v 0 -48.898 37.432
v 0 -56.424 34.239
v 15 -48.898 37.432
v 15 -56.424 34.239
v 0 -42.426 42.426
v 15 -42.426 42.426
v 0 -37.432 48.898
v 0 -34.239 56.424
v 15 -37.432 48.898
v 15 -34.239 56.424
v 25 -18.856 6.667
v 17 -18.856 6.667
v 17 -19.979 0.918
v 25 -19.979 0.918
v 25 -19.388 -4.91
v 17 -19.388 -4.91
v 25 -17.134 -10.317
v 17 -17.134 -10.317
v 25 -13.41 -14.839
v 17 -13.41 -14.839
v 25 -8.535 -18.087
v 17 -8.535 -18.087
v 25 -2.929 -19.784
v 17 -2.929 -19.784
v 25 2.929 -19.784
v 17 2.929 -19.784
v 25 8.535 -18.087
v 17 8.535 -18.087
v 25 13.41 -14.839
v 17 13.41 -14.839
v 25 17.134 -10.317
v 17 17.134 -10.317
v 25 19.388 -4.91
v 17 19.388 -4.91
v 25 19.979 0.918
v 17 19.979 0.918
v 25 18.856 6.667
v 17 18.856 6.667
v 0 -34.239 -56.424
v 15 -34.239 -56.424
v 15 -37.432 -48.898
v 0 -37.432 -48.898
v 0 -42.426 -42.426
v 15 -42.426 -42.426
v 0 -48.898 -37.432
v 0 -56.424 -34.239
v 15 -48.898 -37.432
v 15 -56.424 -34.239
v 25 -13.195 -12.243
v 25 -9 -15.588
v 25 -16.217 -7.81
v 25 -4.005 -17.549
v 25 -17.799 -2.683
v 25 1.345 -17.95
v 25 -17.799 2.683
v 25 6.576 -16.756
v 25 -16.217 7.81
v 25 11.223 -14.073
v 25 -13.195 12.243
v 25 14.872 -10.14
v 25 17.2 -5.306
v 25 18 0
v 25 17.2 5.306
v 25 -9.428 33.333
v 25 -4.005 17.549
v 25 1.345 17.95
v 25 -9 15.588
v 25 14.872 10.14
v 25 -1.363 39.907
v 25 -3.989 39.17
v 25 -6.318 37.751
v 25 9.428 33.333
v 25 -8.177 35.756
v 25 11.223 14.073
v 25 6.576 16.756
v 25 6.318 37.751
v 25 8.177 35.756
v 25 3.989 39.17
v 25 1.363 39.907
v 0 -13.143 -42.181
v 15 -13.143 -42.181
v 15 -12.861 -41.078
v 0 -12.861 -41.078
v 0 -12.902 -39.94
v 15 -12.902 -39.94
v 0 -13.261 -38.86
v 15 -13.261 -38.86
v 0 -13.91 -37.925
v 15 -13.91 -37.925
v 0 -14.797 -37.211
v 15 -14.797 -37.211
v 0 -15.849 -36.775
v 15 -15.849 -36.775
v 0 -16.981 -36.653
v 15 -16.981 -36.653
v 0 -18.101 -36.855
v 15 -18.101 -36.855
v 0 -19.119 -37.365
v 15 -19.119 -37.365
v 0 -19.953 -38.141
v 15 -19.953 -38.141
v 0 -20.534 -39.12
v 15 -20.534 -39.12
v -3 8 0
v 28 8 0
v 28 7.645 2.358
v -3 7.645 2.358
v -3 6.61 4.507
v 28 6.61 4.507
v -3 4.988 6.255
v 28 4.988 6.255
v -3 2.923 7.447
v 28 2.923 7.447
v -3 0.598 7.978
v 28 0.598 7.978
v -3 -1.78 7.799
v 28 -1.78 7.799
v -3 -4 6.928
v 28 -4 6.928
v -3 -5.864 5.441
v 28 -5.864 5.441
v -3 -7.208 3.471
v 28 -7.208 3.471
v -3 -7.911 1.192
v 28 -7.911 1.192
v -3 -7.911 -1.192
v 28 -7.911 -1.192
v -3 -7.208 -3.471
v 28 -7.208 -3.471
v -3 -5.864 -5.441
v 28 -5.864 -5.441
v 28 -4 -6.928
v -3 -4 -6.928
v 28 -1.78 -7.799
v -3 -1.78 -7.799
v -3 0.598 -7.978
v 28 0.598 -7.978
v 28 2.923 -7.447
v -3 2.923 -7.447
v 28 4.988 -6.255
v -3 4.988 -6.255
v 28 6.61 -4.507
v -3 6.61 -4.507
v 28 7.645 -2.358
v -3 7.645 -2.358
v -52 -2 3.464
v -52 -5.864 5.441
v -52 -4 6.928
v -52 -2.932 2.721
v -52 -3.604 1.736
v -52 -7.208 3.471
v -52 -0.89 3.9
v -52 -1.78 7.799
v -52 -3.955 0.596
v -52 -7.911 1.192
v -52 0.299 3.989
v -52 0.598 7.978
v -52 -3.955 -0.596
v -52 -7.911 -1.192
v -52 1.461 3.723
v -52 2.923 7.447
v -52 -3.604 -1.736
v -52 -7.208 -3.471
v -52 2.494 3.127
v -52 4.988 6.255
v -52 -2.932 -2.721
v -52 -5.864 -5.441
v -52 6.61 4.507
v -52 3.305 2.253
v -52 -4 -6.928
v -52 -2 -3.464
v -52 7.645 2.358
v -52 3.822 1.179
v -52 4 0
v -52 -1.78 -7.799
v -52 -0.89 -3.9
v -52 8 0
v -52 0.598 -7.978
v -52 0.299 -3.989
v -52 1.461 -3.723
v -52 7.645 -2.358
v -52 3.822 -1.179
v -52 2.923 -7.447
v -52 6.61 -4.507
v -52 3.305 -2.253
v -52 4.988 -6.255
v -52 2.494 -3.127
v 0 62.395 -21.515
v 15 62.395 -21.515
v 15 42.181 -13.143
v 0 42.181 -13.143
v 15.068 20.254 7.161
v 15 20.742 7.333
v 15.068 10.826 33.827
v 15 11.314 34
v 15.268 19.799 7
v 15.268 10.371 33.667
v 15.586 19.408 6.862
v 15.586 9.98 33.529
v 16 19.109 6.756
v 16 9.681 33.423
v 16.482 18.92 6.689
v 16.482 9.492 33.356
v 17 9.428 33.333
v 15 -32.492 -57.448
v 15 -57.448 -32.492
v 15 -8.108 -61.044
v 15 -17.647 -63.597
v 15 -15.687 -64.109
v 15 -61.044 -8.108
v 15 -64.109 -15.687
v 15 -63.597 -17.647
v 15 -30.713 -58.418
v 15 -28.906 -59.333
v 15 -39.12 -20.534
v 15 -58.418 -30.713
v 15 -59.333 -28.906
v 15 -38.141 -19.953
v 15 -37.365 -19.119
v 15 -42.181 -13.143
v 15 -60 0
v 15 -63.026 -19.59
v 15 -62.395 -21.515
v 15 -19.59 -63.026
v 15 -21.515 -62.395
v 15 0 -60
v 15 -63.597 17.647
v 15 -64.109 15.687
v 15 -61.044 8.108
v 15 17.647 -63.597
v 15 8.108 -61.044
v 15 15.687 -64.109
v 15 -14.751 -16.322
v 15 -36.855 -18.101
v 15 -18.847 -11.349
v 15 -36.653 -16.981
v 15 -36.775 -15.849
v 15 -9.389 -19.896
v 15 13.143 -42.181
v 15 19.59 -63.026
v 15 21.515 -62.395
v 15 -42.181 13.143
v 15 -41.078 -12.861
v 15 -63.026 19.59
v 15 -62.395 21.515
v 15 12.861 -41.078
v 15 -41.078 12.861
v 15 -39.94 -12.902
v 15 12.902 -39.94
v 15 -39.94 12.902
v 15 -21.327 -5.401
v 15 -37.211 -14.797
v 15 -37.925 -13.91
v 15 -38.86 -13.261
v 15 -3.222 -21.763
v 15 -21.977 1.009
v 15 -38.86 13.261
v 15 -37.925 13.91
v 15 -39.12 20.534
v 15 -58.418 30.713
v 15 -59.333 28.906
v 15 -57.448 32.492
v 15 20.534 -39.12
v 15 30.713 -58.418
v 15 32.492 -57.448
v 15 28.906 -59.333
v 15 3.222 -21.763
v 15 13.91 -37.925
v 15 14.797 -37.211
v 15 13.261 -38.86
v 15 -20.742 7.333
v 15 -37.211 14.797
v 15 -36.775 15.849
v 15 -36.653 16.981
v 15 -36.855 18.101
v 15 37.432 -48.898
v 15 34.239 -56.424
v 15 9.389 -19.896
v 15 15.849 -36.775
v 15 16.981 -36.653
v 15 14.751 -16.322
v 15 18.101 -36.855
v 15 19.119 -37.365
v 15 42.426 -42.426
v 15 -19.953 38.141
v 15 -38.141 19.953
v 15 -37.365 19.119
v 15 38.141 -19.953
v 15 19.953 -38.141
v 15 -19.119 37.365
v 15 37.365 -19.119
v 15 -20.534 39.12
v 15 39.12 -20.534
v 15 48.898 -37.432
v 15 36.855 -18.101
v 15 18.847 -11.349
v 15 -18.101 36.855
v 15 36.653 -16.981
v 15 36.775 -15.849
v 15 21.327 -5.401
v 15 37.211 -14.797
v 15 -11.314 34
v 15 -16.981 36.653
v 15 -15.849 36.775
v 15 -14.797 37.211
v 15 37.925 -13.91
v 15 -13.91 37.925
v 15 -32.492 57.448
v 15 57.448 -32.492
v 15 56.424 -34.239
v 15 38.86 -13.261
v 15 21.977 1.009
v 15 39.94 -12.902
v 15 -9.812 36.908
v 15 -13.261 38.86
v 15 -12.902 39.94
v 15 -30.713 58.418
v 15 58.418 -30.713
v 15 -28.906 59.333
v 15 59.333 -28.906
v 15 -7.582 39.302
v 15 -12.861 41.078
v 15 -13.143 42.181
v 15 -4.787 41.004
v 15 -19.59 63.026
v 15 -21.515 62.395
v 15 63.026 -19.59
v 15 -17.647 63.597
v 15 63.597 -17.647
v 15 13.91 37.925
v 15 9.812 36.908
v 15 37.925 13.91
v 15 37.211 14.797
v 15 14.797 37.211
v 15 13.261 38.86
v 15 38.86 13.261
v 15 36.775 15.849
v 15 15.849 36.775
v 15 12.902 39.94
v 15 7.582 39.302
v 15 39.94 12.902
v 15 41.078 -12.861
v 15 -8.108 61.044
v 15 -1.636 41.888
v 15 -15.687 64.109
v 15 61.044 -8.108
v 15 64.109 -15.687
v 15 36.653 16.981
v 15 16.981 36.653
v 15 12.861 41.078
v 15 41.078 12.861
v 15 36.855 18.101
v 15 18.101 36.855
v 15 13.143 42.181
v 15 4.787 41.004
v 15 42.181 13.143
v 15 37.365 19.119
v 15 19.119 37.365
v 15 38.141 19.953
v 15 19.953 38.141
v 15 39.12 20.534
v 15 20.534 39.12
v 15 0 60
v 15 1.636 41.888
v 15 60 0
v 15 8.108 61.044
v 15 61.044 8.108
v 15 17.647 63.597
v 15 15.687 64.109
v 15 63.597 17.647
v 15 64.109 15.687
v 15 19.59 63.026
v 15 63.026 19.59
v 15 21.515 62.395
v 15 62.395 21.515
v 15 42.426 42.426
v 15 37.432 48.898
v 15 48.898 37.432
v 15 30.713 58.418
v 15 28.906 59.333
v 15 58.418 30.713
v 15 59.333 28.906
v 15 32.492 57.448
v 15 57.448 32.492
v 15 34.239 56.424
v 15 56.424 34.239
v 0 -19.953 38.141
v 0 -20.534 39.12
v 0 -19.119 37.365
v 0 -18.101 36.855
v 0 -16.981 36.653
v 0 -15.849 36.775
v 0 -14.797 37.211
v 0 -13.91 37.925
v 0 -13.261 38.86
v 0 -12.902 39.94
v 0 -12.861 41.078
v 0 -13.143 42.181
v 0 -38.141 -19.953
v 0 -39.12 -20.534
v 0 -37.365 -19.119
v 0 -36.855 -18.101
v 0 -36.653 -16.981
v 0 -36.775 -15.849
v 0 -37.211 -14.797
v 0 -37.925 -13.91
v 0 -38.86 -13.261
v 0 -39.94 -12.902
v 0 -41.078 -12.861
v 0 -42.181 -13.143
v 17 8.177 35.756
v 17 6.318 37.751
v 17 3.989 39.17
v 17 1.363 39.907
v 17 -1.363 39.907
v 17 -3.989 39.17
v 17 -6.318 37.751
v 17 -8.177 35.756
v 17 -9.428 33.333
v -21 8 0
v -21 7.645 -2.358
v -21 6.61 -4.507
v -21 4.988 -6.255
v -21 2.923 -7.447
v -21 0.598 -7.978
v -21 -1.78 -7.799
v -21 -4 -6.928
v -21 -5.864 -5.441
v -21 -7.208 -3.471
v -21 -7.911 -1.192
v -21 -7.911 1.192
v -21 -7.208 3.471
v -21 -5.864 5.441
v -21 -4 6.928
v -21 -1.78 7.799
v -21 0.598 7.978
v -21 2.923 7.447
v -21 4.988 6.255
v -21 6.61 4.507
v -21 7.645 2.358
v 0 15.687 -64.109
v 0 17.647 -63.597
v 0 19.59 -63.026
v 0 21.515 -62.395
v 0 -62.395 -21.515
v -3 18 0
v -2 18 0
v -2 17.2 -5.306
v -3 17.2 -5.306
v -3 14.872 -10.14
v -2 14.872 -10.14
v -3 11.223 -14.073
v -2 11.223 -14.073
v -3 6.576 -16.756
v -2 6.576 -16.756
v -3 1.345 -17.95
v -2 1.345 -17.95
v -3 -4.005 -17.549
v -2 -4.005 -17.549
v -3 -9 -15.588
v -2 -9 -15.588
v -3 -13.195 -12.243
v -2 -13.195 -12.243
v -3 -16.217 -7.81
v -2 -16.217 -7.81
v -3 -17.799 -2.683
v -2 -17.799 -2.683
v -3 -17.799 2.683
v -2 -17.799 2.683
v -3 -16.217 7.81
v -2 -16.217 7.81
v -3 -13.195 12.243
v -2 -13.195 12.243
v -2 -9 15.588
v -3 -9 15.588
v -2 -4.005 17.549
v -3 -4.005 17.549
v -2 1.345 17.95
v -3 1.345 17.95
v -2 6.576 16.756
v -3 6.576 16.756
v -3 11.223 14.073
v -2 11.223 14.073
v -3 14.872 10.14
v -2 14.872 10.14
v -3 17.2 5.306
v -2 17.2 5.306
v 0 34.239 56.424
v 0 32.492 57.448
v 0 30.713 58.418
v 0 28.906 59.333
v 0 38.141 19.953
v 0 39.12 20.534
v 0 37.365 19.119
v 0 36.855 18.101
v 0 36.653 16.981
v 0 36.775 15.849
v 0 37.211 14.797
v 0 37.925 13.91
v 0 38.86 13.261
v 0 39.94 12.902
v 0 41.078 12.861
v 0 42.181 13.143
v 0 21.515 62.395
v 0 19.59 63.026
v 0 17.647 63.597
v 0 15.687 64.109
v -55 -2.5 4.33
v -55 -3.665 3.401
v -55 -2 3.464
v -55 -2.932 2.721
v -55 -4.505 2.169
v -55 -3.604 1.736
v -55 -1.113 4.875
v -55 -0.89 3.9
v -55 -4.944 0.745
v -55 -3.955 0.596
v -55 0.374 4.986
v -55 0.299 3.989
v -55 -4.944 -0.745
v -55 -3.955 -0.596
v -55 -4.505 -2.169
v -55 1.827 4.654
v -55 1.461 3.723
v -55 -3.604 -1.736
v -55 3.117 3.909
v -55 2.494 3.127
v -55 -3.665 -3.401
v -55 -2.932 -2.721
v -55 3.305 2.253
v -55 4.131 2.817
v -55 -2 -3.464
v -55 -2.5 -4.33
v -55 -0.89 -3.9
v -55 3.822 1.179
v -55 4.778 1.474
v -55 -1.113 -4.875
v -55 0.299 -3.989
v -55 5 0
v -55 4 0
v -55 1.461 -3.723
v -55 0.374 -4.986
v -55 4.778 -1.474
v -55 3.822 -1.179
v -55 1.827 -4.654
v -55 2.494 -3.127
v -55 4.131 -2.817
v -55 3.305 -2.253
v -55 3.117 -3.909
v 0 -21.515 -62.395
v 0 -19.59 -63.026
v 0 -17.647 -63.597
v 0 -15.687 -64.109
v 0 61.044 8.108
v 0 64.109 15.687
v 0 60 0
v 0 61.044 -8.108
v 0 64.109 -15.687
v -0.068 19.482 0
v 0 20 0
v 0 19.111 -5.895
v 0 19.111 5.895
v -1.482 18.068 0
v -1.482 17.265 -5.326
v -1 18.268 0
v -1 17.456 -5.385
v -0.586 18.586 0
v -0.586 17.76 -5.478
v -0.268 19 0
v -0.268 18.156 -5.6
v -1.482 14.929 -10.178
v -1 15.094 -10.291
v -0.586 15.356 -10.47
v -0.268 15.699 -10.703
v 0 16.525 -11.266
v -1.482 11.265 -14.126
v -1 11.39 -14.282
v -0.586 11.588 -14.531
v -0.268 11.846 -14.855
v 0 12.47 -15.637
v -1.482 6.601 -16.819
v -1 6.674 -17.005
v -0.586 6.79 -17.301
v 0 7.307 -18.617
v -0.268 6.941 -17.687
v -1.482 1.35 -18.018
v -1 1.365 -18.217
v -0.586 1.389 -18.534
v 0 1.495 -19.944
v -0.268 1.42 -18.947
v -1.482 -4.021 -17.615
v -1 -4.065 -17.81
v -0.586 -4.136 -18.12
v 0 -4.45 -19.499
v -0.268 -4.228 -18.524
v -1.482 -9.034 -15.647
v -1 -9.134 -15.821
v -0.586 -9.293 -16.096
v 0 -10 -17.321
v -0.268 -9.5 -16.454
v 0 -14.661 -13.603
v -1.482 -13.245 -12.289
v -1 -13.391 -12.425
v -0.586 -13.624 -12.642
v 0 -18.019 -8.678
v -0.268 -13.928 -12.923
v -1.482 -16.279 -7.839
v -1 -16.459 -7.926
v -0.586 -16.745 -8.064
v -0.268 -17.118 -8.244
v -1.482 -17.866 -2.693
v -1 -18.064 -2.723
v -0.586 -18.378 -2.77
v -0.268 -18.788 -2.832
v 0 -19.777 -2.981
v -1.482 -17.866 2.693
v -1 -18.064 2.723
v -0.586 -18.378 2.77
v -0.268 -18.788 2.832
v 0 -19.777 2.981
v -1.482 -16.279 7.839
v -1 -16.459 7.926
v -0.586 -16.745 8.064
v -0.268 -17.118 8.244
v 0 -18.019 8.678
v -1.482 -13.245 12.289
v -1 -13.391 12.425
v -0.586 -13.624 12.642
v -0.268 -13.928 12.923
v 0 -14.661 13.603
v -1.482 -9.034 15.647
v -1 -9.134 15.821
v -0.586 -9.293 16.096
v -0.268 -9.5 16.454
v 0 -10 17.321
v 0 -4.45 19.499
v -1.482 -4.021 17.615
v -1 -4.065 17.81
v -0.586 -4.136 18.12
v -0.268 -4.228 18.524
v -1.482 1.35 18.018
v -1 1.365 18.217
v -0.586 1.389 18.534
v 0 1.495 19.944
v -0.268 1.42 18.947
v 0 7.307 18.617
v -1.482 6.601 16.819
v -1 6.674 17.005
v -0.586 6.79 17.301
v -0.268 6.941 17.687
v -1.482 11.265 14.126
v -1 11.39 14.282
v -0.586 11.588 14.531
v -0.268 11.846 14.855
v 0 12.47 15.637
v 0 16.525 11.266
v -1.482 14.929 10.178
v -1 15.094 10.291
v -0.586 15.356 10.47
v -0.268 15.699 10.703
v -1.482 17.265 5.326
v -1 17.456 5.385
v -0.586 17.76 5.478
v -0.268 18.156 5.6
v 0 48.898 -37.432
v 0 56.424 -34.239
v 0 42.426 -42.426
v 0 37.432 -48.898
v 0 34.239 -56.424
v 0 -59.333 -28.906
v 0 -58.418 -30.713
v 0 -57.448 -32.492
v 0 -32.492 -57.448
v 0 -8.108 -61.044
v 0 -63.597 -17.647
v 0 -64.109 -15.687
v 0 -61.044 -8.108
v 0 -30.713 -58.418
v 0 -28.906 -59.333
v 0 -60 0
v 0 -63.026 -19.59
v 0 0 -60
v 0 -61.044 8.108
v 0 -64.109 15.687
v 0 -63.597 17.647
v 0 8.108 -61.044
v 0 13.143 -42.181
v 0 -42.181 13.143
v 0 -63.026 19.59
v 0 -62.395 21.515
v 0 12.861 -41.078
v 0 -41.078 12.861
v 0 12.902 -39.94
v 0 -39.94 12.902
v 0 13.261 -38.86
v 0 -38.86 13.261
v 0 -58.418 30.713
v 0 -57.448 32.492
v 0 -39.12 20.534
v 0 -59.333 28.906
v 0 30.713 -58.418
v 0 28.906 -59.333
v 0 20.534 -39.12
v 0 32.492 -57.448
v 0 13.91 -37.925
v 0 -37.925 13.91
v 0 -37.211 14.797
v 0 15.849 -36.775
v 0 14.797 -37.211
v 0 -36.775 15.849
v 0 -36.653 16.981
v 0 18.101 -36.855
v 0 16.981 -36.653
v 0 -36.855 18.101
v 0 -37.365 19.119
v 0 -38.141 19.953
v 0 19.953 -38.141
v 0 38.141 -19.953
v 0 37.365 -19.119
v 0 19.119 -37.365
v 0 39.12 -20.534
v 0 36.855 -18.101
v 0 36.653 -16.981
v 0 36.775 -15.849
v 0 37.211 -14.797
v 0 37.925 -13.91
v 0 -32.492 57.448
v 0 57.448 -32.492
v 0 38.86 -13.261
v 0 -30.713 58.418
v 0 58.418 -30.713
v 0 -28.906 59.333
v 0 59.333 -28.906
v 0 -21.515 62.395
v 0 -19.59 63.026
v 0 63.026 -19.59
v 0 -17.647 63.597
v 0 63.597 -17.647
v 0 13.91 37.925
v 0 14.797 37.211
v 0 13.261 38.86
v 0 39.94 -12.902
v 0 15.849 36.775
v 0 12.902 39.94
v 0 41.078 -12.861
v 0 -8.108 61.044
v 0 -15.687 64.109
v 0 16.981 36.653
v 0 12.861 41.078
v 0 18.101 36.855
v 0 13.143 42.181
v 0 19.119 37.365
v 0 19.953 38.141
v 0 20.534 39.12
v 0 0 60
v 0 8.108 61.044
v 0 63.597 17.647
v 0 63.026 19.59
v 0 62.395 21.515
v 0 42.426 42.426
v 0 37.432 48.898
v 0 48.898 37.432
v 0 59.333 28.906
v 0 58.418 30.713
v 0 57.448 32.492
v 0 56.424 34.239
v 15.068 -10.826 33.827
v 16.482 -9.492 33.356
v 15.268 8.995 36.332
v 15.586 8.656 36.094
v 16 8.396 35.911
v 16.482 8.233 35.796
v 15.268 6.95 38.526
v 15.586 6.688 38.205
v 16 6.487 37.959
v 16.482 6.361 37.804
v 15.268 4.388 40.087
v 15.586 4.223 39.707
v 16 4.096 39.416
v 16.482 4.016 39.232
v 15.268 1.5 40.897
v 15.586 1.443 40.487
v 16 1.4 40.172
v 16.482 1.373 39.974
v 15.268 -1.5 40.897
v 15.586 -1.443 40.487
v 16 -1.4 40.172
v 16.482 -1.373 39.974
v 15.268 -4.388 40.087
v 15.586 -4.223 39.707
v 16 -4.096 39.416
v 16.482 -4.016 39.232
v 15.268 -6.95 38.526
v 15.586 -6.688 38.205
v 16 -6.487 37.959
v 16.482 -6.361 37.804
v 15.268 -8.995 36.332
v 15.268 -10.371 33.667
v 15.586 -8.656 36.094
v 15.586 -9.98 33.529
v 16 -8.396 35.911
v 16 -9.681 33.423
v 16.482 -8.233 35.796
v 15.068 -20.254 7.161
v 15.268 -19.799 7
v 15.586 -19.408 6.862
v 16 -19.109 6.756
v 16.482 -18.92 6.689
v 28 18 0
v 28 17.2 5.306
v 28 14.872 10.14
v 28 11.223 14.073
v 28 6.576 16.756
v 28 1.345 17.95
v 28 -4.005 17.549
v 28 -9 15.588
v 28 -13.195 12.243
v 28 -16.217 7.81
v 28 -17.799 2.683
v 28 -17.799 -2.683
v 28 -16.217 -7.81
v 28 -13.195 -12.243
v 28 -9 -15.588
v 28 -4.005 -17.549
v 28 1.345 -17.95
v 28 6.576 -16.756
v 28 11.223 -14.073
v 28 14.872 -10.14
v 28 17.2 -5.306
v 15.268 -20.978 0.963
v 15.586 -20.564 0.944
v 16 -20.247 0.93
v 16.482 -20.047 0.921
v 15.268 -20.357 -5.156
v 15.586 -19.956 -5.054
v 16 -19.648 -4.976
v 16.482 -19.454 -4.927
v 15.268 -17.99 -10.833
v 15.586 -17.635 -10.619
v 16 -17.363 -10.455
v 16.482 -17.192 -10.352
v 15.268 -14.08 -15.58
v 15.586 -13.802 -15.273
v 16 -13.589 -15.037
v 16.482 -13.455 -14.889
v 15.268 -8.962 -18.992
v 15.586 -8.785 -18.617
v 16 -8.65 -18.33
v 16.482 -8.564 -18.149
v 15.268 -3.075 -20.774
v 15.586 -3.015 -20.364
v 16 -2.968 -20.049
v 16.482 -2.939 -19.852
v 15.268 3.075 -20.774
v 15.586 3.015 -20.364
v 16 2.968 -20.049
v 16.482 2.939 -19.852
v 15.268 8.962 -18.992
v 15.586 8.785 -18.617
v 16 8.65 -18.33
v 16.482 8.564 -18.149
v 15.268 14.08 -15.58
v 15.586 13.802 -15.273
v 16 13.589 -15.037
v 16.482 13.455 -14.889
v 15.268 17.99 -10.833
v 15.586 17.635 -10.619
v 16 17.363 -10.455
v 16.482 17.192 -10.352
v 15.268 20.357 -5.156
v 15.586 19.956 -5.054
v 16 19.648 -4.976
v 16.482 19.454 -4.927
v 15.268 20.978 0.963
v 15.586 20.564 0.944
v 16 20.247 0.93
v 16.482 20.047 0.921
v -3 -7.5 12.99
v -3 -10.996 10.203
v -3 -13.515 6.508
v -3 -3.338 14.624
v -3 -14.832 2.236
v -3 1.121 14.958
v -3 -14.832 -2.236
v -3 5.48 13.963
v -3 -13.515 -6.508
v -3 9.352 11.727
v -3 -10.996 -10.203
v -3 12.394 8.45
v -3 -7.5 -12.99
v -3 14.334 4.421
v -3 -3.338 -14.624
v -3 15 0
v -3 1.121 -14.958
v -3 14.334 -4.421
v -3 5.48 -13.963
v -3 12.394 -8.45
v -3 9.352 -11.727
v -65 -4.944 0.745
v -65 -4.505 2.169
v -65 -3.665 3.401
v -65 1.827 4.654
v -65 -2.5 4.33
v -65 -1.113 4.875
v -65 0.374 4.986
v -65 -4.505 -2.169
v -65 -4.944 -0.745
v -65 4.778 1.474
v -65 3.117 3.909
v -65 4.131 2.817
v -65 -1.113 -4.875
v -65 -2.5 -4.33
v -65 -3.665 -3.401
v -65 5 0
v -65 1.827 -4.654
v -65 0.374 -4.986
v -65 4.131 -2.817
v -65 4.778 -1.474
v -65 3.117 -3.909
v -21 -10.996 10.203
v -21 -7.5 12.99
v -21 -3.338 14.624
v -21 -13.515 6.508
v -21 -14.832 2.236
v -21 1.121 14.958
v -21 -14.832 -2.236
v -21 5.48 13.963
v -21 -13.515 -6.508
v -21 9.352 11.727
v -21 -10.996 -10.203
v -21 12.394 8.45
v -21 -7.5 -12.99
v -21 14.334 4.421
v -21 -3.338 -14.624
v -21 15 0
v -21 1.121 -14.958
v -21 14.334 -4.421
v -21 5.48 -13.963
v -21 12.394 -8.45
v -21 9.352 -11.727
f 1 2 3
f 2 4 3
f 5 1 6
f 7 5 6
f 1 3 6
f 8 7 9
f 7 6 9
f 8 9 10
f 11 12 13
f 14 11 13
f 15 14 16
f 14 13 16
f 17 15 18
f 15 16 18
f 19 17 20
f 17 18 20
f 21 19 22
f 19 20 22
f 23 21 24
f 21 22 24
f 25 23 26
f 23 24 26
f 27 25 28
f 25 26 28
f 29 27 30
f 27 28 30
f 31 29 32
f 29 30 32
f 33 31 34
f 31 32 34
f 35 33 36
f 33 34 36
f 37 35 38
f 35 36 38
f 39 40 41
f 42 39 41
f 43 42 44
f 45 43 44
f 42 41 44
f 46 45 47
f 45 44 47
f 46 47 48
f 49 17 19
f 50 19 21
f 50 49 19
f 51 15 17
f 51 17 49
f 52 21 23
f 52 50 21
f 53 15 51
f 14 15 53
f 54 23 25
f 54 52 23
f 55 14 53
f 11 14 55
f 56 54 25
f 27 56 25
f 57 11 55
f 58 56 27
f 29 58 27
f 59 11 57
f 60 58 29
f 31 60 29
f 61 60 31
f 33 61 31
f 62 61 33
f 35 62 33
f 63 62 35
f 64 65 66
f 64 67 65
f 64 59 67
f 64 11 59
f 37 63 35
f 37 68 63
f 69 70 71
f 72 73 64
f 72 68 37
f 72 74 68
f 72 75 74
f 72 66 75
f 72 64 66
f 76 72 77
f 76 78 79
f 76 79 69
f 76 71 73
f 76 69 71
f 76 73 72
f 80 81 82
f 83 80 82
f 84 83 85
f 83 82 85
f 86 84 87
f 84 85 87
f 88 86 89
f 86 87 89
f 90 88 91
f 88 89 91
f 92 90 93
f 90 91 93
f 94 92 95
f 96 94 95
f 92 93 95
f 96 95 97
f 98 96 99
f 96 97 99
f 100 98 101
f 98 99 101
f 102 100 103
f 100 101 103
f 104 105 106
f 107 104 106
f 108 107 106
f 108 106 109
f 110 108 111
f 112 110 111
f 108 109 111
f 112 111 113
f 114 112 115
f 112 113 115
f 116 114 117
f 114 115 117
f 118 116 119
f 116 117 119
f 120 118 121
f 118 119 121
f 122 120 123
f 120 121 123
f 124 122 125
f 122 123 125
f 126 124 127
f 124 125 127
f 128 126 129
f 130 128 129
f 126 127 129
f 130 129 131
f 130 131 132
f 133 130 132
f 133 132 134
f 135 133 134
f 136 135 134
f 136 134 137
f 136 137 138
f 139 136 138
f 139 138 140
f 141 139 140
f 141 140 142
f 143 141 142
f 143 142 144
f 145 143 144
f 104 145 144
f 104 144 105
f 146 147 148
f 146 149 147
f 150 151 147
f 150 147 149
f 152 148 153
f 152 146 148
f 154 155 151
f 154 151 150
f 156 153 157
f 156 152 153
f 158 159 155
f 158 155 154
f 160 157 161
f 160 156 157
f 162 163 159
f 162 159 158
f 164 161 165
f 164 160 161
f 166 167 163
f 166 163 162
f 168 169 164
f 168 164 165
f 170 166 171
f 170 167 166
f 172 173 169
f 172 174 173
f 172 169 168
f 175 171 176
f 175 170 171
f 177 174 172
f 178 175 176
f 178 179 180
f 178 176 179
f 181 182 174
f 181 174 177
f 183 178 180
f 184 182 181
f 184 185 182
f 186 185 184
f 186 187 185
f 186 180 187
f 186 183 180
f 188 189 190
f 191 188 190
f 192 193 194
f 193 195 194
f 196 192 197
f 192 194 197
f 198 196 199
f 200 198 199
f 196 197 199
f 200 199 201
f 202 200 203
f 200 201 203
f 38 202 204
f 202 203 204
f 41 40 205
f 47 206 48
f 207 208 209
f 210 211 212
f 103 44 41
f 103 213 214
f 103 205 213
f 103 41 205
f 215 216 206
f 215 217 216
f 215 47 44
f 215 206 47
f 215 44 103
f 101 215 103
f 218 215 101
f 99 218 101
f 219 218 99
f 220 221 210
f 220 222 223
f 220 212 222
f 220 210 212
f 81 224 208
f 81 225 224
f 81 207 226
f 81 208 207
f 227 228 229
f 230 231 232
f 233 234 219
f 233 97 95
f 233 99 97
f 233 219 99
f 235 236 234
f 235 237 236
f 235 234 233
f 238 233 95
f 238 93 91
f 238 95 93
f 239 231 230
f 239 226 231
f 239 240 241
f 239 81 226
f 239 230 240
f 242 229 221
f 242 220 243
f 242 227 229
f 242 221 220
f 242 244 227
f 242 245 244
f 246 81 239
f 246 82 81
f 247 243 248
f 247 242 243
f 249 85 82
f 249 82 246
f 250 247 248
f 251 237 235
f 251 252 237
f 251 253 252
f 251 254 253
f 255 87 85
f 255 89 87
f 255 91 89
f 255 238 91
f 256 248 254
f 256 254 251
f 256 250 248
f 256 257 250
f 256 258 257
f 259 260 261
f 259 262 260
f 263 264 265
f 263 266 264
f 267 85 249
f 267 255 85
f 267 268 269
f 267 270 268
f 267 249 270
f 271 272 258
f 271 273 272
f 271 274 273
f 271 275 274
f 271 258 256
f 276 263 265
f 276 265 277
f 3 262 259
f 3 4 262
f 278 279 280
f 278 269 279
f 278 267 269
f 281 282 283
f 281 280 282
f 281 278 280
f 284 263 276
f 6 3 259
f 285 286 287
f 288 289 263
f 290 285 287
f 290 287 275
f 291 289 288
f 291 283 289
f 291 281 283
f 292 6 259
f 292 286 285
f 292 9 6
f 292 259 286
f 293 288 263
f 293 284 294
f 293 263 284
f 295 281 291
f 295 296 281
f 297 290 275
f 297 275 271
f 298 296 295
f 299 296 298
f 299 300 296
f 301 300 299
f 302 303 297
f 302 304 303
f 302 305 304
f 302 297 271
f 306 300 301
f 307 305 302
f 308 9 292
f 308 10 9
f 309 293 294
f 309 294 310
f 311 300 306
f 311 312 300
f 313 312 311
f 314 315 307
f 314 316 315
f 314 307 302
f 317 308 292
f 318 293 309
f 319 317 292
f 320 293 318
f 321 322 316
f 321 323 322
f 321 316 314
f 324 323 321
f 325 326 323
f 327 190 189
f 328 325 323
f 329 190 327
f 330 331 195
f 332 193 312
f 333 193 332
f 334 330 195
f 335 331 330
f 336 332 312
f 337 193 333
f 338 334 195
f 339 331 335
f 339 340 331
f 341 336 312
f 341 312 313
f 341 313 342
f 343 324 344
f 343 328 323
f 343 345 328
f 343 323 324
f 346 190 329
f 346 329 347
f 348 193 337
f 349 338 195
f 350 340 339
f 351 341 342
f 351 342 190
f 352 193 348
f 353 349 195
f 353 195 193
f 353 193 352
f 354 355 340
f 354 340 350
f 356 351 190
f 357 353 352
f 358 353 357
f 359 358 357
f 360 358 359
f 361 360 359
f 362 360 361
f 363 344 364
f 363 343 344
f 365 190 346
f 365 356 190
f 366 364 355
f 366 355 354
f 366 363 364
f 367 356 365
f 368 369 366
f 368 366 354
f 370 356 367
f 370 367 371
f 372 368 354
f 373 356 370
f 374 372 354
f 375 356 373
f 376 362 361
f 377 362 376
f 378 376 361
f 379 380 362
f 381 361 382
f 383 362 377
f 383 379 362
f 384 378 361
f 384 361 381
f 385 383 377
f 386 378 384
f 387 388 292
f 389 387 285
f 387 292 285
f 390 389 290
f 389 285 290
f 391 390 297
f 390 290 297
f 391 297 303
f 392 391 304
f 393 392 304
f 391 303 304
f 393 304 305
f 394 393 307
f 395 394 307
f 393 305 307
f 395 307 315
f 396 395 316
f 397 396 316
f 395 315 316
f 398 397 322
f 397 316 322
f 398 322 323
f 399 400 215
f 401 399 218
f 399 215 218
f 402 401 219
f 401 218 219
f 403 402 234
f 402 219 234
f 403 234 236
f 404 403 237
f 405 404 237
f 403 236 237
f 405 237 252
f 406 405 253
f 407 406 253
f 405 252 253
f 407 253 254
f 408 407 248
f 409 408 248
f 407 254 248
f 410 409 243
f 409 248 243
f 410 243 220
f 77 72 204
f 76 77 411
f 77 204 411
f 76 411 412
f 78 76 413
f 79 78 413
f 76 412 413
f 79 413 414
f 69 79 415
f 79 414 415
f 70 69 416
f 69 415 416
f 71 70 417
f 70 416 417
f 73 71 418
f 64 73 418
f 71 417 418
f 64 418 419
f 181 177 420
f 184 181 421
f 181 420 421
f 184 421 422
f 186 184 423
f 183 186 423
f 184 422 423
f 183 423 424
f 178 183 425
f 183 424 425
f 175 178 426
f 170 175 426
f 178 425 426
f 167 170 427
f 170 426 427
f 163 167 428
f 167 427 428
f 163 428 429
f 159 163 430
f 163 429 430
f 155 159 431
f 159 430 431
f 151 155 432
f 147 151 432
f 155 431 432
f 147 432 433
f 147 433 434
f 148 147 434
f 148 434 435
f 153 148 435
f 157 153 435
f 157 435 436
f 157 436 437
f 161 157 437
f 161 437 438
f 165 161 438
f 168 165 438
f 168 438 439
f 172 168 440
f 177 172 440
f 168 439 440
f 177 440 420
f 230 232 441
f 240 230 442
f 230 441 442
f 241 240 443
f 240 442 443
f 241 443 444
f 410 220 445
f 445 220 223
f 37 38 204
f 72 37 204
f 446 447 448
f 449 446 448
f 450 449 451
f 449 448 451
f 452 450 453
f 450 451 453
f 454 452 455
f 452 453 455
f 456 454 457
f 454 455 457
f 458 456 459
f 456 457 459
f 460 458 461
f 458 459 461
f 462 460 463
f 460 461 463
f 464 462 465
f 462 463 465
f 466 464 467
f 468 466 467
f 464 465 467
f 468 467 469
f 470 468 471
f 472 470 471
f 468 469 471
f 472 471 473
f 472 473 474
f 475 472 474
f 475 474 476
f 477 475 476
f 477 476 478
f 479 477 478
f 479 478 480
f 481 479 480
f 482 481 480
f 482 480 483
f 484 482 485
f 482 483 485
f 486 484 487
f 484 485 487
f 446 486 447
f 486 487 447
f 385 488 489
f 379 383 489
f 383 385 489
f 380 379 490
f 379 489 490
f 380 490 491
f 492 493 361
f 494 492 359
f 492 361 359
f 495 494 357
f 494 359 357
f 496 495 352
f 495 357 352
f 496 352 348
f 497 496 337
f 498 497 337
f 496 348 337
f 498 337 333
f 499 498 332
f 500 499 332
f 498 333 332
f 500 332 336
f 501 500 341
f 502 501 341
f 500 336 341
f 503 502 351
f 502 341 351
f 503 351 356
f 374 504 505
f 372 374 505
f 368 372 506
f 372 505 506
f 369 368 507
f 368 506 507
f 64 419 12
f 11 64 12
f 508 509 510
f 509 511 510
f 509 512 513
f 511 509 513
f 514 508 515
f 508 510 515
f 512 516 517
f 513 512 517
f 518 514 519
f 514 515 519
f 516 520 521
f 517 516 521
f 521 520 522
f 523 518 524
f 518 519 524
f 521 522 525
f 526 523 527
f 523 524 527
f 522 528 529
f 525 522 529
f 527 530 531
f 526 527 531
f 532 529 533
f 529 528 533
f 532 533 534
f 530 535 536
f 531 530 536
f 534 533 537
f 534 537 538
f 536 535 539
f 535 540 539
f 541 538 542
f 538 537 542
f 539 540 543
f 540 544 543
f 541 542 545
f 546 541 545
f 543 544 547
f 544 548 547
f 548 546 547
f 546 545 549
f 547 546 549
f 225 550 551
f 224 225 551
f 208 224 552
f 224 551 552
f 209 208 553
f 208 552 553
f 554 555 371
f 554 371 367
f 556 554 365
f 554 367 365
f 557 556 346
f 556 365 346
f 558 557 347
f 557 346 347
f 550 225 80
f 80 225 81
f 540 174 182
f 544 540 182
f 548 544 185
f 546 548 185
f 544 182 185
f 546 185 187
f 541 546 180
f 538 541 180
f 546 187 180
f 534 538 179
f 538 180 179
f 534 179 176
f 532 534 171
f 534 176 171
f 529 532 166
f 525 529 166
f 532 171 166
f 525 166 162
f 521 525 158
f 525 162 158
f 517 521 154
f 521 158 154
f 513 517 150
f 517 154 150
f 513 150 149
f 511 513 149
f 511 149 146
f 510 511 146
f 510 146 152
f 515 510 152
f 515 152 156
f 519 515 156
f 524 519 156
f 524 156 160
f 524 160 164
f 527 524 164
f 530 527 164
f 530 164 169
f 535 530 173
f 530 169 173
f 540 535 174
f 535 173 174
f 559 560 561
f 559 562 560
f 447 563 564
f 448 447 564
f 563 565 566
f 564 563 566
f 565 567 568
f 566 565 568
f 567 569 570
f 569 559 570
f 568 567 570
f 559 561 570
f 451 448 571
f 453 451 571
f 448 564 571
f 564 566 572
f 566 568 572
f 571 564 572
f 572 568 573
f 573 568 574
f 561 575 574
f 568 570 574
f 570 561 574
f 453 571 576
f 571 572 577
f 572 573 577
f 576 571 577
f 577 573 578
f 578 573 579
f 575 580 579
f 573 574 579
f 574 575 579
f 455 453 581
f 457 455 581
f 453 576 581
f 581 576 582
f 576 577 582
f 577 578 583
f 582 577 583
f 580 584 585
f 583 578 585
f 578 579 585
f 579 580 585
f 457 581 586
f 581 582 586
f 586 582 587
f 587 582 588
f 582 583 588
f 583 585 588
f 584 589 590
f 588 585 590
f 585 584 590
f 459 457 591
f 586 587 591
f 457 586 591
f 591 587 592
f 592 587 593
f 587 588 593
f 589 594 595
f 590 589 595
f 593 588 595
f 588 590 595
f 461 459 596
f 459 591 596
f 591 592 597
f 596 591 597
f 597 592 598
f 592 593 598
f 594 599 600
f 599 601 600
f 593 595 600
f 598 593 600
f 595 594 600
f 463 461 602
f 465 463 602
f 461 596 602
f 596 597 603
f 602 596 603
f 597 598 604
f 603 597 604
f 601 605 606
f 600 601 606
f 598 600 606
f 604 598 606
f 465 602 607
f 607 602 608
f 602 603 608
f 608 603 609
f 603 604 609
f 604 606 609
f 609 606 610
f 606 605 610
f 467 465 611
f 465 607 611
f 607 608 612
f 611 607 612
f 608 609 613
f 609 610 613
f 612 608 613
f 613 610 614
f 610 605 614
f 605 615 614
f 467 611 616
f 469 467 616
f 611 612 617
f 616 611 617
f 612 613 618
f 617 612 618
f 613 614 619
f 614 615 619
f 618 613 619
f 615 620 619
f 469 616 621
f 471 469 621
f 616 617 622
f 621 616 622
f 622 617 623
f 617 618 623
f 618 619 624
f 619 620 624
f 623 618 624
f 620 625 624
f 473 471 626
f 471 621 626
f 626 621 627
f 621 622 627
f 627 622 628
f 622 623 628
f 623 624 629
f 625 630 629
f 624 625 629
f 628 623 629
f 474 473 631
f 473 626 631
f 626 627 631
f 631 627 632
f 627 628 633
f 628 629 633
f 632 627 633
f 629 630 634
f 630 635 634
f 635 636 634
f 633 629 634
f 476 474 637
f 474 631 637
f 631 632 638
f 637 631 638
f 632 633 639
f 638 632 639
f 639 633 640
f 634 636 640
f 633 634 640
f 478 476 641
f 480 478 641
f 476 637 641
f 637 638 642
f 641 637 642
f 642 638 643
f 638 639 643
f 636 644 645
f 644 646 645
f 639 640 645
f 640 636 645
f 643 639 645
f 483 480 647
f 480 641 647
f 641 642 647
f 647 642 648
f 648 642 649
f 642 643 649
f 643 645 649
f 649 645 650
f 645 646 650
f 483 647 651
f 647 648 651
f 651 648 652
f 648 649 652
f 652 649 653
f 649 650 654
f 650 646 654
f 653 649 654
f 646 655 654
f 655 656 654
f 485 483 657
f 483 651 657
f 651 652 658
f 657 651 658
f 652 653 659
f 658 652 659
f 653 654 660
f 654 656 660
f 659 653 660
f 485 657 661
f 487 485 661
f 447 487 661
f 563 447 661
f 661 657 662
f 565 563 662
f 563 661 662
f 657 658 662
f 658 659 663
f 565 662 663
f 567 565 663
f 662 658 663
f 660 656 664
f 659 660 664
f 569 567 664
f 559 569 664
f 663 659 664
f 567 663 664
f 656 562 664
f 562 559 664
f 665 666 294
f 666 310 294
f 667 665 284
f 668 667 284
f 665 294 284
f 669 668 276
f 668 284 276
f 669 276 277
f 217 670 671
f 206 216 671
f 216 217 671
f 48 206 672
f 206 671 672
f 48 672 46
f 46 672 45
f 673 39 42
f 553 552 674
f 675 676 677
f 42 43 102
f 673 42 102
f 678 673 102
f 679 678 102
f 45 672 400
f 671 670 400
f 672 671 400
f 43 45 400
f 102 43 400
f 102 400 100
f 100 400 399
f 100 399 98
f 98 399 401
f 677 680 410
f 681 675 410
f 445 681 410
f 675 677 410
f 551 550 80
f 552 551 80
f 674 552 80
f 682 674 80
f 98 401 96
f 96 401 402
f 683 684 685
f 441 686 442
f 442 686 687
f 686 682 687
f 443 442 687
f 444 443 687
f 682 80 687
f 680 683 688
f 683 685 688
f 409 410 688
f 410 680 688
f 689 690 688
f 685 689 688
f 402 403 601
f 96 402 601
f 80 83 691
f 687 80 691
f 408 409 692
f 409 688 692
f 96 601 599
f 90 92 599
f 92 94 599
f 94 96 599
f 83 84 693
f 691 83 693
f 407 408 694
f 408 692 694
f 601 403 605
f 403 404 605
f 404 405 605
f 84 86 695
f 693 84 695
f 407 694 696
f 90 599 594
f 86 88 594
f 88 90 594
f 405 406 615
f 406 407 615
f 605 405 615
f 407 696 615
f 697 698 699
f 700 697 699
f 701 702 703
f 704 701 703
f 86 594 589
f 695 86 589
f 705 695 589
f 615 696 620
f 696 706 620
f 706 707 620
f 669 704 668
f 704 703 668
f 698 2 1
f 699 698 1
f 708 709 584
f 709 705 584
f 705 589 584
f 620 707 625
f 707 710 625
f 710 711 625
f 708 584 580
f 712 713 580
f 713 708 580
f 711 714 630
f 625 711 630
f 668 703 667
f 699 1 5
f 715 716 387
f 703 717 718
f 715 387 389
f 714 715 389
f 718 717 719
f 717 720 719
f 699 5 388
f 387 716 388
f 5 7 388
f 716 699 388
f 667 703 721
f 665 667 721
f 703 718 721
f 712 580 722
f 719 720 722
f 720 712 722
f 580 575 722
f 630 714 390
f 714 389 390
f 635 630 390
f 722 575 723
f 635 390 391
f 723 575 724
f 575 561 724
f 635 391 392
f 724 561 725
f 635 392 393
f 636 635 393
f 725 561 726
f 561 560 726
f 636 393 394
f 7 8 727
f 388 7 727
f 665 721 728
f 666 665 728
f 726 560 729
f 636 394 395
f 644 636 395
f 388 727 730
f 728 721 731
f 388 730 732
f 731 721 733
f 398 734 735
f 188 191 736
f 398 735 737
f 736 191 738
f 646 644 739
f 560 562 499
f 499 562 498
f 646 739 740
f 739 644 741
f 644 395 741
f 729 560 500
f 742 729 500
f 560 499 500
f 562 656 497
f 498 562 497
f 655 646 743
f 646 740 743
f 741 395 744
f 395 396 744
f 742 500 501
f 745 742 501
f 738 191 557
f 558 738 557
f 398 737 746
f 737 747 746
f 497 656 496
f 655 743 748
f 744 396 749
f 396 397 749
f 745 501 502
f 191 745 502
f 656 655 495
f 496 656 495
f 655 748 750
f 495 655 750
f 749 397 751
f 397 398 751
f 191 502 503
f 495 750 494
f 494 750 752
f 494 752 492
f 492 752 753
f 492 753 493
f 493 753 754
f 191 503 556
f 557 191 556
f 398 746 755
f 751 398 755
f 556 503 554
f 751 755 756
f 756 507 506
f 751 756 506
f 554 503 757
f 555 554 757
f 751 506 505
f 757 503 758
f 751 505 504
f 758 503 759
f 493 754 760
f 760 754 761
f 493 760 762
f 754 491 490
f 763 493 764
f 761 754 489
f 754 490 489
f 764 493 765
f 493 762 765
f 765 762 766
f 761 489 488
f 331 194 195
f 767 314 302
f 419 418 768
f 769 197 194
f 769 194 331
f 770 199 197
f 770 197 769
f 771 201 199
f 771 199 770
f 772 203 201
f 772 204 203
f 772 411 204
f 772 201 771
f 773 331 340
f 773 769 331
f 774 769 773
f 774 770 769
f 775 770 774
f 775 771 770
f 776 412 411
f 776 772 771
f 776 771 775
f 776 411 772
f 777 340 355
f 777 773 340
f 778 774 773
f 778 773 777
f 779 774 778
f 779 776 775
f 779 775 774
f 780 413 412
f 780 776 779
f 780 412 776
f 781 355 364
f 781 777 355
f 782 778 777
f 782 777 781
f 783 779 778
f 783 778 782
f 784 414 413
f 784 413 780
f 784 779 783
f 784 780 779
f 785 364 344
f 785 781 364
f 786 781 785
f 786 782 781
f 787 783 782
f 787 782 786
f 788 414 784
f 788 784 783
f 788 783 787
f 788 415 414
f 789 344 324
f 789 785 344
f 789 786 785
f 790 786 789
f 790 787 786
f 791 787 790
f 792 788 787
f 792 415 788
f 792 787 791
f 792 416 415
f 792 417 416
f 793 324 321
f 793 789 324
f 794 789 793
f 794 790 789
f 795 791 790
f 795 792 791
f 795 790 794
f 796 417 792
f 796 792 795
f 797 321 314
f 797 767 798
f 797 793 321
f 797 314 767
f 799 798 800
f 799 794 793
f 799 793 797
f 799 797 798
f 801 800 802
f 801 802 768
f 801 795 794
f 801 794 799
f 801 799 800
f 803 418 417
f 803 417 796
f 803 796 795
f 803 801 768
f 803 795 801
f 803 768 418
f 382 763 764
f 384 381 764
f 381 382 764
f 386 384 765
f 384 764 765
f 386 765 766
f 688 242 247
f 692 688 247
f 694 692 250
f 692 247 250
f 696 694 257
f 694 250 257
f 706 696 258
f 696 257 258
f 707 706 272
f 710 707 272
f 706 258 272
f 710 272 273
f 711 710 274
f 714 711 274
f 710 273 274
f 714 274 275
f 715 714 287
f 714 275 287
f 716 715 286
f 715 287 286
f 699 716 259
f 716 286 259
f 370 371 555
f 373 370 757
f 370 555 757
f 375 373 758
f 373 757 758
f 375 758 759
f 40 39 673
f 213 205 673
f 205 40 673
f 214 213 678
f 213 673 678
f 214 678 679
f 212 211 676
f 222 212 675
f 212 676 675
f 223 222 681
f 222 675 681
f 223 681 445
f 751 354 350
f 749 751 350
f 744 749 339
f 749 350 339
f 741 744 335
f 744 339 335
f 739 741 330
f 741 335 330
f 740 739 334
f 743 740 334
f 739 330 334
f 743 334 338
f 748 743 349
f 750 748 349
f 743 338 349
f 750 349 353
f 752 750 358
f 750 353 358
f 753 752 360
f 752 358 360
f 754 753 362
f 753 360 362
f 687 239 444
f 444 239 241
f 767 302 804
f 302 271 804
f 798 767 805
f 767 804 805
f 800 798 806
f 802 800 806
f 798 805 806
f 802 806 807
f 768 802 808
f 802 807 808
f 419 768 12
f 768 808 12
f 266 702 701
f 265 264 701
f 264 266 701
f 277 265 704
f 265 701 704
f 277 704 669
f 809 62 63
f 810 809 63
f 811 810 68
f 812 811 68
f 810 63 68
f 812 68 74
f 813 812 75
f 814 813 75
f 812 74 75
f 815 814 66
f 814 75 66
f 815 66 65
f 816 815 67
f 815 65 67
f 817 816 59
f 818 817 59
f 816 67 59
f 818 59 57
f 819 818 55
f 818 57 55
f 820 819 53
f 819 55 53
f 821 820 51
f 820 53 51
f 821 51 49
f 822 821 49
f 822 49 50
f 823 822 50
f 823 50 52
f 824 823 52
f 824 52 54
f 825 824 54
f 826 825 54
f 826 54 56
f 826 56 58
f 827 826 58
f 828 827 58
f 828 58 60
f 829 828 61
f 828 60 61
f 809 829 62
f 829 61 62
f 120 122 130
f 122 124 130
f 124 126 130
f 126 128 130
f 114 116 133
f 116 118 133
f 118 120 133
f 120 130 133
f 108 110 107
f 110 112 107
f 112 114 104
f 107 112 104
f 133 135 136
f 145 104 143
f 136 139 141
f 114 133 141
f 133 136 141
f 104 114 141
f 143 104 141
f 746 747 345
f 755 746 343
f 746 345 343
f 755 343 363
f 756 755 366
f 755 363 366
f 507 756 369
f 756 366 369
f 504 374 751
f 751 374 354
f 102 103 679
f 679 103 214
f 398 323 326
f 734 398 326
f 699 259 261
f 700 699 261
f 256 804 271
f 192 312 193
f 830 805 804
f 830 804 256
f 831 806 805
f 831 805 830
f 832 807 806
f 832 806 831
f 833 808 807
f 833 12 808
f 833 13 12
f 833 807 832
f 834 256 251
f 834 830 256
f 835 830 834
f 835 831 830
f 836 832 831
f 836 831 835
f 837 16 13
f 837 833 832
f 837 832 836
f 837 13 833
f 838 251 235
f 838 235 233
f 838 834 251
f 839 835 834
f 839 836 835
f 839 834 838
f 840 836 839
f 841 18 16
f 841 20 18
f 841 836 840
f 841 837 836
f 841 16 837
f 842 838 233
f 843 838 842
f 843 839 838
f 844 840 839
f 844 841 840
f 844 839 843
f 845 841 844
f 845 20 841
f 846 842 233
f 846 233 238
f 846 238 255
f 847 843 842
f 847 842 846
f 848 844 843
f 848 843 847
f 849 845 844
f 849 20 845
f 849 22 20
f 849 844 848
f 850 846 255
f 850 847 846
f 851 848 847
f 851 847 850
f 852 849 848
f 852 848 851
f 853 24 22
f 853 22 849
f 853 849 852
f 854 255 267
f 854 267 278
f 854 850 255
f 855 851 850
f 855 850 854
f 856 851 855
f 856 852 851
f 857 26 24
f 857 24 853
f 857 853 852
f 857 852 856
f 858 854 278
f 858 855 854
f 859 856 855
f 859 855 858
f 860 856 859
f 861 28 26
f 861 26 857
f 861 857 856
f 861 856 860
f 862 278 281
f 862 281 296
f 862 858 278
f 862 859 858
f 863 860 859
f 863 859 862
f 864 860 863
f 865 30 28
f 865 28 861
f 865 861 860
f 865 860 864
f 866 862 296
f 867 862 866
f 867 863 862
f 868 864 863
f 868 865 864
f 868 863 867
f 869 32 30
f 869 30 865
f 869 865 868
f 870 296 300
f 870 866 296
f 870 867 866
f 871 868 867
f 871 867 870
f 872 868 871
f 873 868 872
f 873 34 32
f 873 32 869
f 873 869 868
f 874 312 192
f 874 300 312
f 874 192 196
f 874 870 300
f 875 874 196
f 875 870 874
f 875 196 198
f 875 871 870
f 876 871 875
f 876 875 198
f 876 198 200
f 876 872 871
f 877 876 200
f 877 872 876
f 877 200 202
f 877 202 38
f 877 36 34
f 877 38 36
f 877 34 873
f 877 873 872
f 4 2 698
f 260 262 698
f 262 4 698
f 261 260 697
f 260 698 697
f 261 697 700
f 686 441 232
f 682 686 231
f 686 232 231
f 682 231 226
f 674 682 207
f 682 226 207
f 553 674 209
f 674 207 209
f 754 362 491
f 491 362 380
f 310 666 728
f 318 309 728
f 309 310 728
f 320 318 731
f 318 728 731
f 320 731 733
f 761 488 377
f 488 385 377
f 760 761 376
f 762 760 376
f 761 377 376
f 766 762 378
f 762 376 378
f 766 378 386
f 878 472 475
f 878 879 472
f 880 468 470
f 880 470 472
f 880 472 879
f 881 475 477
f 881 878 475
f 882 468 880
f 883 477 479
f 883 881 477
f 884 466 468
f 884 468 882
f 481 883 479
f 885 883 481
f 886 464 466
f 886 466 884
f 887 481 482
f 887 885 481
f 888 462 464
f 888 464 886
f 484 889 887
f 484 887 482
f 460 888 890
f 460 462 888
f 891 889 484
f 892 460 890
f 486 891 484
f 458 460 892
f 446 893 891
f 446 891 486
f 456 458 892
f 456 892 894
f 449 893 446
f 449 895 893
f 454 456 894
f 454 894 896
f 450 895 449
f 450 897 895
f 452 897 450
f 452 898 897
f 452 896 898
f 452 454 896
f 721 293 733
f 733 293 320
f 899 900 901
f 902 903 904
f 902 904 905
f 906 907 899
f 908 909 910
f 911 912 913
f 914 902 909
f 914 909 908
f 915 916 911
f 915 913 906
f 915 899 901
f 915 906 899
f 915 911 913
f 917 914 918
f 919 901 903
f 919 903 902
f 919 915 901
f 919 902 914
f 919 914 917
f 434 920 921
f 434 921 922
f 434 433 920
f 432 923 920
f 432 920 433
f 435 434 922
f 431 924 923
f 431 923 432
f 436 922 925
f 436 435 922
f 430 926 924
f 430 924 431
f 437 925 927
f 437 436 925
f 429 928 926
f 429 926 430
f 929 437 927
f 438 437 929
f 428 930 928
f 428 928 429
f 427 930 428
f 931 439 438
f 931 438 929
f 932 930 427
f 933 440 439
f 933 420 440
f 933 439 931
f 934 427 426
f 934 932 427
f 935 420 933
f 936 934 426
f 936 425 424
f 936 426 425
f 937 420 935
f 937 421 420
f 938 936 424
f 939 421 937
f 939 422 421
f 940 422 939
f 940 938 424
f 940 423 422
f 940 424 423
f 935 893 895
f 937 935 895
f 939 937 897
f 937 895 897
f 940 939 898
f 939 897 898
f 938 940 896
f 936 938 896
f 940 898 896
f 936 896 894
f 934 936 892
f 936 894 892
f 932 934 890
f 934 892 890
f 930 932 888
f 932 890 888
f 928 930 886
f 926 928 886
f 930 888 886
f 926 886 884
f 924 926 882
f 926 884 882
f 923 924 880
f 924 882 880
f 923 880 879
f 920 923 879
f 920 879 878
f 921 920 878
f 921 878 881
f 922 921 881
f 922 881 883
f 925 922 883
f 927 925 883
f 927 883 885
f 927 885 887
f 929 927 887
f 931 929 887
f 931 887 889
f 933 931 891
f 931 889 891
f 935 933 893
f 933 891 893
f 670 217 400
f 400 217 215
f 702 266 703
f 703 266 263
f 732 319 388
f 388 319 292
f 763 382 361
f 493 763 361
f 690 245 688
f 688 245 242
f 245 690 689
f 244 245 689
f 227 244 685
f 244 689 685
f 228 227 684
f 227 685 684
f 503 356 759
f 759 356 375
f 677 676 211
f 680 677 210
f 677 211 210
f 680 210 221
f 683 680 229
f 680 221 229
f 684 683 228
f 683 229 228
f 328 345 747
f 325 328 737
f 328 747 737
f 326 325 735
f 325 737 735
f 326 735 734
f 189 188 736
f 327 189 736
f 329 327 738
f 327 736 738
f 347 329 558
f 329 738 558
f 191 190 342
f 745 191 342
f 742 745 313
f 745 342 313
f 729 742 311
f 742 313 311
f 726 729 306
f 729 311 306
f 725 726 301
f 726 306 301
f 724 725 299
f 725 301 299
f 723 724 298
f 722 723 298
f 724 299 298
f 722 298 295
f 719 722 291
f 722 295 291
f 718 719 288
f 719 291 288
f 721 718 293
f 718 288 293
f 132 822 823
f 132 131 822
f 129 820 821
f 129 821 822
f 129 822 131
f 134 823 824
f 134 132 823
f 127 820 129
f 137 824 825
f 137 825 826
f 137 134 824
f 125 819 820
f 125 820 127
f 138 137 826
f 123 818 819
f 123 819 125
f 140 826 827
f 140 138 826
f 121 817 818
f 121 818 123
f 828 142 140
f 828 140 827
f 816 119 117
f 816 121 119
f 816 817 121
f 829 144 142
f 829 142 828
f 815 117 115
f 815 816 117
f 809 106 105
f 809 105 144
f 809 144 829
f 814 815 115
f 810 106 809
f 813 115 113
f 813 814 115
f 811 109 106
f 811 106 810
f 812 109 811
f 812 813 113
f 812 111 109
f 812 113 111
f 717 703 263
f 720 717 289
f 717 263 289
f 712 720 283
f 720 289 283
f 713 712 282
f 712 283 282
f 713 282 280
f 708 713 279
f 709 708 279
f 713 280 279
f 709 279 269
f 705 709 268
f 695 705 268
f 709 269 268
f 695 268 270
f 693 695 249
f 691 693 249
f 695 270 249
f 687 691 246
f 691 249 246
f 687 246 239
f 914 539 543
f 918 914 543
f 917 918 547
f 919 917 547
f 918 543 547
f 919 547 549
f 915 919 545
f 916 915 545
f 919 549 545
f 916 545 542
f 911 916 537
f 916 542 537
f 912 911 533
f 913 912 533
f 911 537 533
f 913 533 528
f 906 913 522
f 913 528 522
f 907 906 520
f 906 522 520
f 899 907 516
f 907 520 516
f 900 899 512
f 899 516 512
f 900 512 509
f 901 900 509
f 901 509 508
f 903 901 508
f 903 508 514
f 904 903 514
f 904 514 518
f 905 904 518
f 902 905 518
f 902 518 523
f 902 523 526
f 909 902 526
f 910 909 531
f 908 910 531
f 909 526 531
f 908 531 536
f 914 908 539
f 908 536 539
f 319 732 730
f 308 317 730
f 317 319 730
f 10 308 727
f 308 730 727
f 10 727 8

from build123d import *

# Parameters (mm, degrees)
SKETCH_R              = 66
PAD_DEPTH             = 15
SKETCH001_R           = 32
POCKET_DEPTH          = 389.556737
POLARPATTERN_COUNT    = 8
POCKET001_DEPTH       = 378.893286
POLARPATTERN001_COUNT = 8
PAD001_DEPTH          = 10
SKETCH004_R           = 18
PAD002_DEPTH          = 3
SKETCH005_R           = 18
PAD003_DEPTH          = 3
SKETCH006_R           = 8
POCKET002_DEPTH       = 31.001
SKETCH007_R           = 15
PAD004_DEPTH          = 18
SKETCH008_R           = 8
PAD005_DEPTH          = 31
SKETCH009_R           = 4
PAD006_DEPTH          = 3
SKETCH010_R           = 5
PAD007_DEPTH          = 10
FILLET_R              = 2
FILLET001_R           = 2


with BuildPart() as part:
    # Sketch → Pad (new body)
    with BuildSketch(Plane.YZ):
        Circle(SKETCH_R)
    extrude(amount=PAD_DEPTH)

    # Sketch001 (on Face3 of Pad) → Pocket (cut, through all)
    with BuildSketch(Plane.YZ.offset(15)):
        with Locations((-92, 0)):
            Circle(SKETCH001_R)
    pocket = extrude(amount=-POCKET_DEPTH, mode=Mode.SUBTRACT)

    # PolarPattern: Pocket ×8 about axis
    polarpattern_axis = Axis((15, 0, 0), (1, 0, 0))
    for i in range(1, POLARPATTERN_COUNT):
        add(pocket.rotate(polarpattern_axis, i * 360 / POLARPATTERN_COUNT), mode=Mode.SUBTRACT)

    # Sketch002 (on Face1 of PolarPattern) → Pocket001 (cut, through all)
    with BuildSketch(Plane.YZ.offset(15)):
        with BuildLine():
            ThreePointArc((-63.774583, 30.745866), (-69.000835, 28.581082), (-66.836051, 23.35483))
            Line((-66.836051, 23.35483), (-42.181433, 13.142553))
            ThreePointArc((-42.181433, 13.142553), (-36.955181, 15.307337), (-39.119966, 20.533589))
            Line((-39.119966, 20.533589), (-63.774583, 30.745866))
        make_face()
    pocket001 = extrude(amount=-POCKET001_DEPTH, mode=Mode.SUBTRACT)

    # PolarPattern001: Pocket001 ×8 about axis
    polarpattern001_axis = Axis((15, 0, 0), (1, 0, 0))
    for i in range(1, POLARPATTERN001_COUNT):
        add(pocket001.rotate(polarpattern001_axis, i * 360 / POLARPATTERN001_COUNT), mode=Mode.SUBTRACT)

    # Sketch003 (on Face1 of PolarPattern001) → Pad001 (join)
    with BuildSketch(Plane.YZ.offset(15)):
        with BuildLine():
            ThreePointArc((9.42809, 33.333333), (0, 40), (-9.42809, 33.333333))
            Line((-9.42809, 33.333333), (-18.856181, 6.666667))
            ThreePointArc((-18.856181, 6.666667), (0, -20), (18.856181, 6.666667))
            Line((18.856181, 6.666667), (9.42809, 33.333333))
        make_face()
    extrude(amount=PAD001_DEPTH)

    # Sketch004 (on Face55 of Pad001) → Pad002 (join)
    with BuildSketch(Plane.YZ.offset(25)):
        Circle(SKETCH004_R)
    extrude(amount=PAD002_DEPTH)

    # Sketch005 (on Face54 of Pad002) → Pad003 (join)
    with BuildSketch(Plane(origin=(0, 0, 0), x_dir=(0, 1, 0), z_dir=(-1, 0, 0))):
        Circle(SKETCH005_R)
    extrude(amount=PAD003_DEPTH)

    # Sketch006 (on Face59 of Pad003) → Pocket002 (cut, through all)
    with BuildSketch(Plane.YZ.offset(28)):
        Circle(SKETCH006_R)
    extrude(amount=-POCKET002_DEPTH, mode=Mode.SUBTRACT)

    # Sketch007 (on Face58 of Pocket002) → Pad004 (join)
    with BuildSketch(Plane(origin=(-3, 0, 0), x_dir=(0, 1, 0), z_dir=(-1, 0, 0))):
        Circle(SKETCH007_R)
    extrude(amount=PAD004_DEPTH)

    # Sketch008 (on Face62 of Pad004) → Pad005 (join)
    with BuildSketch(Plane(origin=(-21, 0, 0), x_dir=(0, 1, 0), z_dir=(-1, 0, 0))):
        Circle(SKETCH008_R)
    extrude(amount=PAD005_DEPTH)

    # Sketch009 (on Face65 of Pad005) → Pad006 (join)
    with BuildSketch(Plane(origin=(-52, 0, 0), x_dir=(0, 1, 0), z_dir=(-1, 0, 0))):
        Circle(SKETCH009_R)
    extrude(amount=PAD006_DEPTH)

    # Sketch010 (on Face67 of Pad006) → Pad007 (join)
    with BuildSketch(Plane(origin=(-55, 0, 0), x_dir=(0, 1, 0), z_dir=(-1, 0, 0))):
        Circle(SKETCH010_R)
    extrude(amount=PAD007_DEPTH)

    # Fillet
    fillet_edges = [part.edges().sort_by_distance(p)[0] for p in [
        (0, -18, 0),
    ]]
    fillet(fillet_edges, radius=FILLET_R)

    # Fillet001
    fillet001_edges = [part.edges().sort_by_distance(p)[0] for p in [
        (15, 0, -20),
    ]]
    fillet(fillet001_edges, radius=FILLET001_R)


solid = part.part
